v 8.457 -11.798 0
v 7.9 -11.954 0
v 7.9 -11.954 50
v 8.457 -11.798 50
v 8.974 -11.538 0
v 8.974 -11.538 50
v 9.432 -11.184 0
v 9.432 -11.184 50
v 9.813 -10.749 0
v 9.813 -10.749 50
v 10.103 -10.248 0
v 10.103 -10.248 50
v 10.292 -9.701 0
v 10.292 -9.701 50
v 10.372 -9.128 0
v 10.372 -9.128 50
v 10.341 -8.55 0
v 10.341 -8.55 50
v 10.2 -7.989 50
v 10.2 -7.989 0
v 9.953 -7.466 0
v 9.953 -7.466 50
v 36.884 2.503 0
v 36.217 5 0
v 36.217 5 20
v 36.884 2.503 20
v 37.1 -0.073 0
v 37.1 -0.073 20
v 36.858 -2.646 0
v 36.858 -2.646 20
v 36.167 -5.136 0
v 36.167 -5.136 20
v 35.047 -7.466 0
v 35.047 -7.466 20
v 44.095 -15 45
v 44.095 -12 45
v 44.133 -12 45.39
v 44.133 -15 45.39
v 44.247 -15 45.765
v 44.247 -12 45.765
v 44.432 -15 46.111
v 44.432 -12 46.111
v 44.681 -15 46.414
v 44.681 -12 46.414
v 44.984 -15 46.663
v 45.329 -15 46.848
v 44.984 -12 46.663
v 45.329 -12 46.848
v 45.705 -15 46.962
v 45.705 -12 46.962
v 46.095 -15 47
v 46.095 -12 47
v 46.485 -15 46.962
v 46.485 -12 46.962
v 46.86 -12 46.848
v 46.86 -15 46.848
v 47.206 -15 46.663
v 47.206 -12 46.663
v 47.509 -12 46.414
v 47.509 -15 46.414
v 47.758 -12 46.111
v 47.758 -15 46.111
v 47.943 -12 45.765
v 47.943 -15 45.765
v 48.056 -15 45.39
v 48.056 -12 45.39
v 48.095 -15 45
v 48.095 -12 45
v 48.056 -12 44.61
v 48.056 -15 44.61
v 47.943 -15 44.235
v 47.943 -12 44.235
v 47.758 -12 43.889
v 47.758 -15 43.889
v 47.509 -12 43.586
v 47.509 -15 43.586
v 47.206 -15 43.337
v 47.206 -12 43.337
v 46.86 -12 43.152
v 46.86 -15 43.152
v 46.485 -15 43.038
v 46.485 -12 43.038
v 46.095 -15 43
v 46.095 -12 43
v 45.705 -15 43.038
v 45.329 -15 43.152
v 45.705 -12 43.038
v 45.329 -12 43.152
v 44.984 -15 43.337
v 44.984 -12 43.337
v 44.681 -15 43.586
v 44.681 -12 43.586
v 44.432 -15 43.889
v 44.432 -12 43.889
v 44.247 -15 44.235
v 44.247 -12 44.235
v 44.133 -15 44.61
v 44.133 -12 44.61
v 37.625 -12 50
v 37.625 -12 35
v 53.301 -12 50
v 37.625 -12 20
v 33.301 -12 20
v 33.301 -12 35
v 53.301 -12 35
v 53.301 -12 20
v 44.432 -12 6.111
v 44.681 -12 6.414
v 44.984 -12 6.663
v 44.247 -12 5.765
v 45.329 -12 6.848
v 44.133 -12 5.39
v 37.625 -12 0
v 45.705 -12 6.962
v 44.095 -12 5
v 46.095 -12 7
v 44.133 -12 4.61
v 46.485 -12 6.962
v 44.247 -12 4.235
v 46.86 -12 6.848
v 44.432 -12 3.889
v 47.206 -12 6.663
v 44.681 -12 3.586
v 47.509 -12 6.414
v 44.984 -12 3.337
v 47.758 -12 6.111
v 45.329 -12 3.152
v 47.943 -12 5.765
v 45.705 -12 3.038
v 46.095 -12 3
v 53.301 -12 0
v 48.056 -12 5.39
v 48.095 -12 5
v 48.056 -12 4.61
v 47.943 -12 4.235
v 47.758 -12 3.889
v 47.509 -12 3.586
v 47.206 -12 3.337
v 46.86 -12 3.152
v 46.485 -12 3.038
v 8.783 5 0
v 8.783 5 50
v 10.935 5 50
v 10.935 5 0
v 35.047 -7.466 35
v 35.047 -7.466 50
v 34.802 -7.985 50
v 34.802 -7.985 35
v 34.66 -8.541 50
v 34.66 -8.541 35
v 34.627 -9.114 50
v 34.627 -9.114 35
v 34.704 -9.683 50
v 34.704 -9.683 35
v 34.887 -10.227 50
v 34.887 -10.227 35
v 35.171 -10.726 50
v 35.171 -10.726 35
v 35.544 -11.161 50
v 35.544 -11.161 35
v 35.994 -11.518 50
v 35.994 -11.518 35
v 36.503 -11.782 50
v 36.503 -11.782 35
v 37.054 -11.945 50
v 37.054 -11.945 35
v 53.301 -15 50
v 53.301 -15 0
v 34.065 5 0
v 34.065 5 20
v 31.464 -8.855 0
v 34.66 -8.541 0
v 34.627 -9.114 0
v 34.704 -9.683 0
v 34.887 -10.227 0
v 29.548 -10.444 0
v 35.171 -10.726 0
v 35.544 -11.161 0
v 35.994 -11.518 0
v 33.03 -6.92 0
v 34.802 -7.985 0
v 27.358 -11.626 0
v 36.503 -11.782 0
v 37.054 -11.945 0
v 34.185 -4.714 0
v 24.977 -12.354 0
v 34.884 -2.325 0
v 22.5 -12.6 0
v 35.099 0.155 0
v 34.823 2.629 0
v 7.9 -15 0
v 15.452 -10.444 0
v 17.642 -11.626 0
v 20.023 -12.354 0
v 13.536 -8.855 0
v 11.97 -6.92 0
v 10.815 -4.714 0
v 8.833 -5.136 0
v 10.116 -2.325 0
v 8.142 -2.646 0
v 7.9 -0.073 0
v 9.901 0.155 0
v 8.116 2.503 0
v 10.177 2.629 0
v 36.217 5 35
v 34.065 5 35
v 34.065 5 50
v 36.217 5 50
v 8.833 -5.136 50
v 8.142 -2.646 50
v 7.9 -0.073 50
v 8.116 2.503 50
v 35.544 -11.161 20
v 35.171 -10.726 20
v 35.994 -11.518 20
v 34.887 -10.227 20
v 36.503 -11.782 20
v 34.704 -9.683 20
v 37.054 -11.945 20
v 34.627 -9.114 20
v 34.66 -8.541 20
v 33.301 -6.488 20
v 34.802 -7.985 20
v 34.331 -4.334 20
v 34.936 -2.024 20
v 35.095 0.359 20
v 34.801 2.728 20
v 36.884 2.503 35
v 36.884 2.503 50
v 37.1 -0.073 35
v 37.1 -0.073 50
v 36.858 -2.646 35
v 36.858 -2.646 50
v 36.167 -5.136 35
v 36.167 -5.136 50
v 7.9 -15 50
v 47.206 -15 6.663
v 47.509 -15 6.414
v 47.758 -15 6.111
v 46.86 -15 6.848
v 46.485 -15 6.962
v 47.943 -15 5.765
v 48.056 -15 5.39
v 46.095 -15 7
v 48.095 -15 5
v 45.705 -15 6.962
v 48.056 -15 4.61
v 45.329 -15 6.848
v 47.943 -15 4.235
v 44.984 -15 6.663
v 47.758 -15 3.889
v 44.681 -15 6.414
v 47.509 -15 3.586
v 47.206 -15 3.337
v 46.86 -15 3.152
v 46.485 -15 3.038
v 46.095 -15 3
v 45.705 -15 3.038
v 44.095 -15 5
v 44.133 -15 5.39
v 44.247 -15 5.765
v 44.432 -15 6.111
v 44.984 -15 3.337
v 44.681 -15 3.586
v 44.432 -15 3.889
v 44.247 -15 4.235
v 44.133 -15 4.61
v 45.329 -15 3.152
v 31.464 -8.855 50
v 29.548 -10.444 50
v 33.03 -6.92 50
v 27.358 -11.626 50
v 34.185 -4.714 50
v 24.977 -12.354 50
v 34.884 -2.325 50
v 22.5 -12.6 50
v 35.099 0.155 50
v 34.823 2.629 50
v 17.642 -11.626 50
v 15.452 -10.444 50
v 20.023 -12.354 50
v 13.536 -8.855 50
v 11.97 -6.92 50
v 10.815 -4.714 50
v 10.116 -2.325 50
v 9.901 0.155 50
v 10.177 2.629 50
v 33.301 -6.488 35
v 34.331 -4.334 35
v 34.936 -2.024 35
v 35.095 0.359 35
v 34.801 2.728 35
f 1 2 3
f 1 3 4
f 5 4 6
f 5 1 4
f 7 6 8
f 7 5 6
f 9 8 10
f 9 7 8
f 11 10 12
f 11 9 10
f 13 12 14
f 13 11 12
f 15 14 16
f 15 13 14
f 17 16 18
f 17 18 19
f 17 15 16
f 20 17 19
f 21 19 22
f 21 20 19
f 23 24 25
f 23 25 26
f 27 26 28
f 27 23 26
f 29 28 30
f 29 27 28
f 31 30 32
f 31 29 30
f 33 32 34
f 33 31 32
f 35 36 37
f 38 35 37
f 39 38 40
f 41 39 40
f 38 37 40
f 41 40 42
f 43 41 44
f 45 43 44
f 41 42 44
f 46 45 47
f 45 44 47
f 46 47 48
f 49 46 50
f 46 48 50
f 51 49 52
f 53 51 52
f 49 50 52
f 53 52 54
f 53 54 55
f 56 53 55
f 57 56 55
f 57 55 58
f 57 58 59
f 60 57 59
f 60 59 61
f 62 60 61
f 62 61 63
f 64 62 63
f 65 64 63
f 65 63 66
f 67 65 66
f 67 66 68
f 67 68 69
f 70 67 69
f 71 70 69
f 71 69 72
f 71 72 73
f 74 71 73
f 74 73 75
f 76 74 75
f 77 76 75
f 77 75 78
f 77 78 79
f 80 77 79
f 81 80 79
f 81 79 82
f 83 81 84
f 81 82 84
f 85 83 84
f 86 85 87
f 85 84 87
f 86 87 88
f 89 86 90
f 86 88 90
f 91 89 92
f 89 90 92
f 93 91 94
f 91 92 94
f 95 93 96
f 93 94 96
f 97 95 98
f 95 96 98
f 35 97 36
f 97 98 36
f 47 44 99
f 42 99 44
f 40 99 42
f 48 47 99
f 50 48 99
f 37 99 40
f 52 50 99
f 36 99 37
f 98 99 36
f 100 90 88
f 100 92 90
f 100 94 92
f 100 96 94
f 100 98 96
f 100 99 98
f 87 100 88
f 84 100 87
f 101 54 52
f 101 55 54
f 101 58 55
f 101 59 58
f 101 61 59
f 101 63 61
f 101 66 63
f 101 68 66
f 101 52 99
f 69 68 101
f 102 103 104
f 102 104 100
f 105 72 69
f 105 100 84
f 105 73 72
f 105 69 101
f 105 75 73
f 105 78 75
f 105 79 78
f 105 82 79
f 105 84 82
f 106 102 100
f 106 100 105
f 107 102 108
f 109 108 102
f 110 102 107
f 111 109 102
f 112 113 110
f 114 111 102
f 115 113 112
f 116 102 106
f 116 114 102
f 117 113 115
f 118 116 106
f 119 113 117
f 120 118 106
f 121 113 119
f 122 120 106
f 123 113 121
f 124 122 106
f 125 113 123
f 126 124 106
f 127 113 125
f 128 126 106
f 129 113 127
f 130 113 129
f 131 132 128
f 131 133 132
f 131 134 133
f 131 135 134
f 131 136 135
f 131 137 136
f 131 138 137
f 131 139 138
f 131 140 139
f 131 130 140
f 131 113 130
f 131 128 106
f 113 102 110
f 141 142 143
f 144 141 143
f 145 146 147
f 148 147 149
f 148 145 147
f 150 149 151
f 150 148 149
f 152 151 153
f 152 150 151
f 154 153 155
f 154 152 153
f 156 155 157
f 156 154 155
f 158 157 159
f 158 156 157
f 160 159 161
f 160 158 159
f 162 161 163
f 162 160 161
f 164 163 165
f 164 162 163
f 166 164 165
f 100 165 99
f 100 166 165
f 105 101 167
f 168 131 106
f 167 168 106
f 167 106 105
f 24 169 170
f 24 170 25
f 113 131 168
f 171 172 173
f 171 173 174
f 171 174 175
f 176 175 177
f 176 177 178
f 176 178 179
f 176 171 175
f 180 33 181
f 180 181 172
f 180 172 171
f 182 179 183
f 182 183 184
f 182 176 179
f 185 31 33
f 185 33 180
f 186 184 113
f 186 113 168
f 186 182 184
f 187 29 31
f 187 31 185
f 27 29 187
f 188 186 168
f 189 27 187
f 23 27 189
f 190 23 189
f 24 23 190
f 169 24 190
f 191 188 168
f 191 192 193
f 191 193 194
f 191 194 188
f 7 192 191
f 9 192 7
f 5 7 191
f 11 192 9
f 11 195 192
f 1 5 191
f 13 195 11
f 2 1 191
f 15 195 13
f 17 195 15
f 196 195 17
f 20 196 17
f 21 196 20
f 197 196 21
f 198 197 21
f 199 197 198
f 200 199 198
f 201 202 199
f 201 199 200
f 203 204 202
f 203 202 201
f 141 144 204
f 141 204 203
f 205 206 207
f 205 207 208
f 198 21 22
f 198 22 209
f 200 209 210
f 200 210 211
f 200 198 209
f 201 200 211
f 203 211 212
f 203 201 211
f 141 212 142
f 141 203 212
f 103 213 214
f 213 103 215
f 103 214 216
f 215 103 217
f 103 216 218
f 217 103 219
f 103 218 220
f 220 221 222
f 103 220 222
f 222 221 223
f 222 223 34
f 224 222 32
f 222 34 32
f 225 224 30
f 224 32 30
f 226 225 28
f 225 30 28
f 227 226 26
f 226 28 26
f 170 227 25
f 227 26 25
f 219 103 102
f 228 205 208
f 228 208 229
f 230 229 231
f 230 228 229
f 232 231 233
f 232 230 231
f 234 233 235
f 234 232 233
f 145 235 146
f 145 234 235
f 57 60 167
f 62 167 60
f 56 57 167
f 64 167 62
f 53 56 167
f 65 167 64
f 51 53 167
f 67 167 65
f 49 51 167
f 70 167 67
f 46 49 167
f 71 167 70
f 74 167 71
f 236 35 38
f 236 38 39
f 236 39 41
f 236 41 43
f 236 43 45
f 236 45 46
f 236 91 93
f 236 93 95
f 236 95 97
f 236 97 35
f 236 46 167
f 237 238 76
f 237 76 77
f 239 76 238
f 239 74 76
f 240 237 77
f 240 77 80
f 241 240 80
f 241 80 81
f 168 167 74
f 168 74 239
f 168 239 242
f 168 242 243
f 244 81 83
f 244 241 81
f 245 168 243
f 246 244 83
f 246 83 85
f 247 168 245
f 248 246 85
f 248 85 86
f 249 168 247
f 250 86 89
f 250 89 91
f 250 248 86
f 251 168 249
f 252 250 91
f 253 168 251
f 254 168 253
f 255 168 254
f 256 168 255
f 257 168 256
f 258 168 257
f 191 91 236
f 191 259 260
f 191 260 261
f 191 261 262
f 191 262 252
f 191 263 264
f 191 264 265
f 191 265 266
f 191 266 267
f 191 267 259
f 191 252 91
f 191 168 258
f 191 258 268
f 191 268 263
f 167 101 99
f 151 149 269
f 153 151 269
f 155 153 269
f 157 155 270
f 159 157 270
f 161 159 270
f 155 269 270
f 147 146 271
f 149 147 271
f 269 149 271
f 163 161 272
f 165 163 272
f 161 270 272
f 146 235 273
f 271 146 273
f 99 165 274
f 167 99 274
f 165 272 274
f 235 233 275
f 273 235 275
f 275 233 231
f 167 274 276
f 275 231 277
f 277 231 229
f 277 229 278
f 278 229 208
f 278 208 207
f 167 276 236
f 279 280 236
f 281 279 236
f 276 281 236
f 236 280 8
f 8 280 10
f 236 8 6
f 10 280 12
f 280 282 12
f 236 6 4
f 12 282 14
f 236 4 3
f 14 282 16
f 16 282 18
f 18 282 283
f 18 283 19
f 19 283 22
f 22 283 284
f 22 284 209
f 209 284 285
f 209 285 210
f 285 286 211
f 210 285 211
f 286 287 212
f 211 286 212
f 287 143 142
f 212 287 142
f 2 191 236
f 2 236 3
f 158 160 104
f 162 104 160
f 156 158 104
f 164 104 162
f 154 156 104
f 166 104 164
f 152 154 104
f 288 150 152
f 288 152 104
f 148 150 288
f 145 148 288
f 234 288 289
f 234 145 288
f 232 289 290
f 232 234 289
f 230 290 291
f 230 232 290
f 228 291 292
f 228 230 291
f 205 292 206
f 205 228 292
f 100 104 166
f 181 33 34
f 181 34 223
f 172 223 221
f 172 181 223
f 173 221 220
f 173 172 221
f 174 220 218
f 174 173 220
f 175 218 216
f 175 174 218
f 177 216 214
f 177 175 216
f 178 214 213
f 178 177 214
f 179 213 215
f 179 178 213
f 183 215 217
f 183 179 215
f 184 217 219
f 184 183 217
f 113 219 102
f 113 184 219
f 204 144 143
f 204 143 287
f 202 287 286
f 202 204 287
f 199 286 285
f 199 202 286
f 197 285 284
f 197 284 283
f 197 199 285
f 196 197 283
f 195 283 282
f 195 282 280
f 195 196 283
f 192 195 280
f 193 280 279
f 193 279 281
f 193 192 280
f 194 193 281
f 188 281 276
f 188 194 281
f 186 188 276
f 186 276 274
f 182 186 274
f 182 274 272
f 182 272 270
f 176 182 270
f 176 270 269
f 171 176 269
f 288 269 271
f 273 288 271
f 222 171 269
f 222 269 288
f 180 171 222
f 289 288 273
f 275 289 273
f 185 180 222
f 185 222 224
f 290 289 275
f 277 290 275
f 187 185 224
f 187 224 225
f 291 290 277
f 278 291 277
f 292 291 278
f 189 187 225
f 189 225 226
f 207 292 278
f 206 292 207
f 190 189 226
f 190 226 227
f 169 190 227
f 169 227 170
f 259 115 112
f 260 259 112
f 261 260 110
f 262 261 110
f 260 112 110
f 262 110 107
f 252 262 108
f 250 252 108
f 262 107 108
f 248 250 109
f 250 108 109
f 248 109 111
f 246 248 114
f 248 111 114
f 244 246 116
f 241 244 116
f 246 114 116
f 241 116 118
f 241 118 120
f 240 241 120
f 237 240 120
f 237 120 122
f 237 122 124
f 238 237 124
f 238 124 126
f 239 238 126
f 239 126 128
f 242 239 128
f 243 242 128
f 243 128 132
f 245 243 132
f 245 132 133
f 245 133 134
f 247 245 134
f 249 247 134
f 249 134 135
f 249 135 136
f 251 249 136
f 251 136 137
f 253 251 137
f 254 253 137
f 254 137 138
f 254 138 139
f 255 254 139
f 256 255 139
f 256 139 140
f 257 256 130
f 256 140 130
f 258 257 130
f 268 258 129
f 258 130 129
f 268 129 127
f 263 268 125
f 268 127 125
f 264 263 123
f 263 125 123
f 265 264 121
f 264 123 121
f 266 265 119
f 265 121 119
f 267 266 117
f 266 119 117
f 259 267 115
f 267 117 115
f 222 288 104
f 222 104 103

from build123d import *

# Parameters (mm, degrees)
BOSS_EXTRUDE1_DEPTH = 50
SKETCH2_W           = 15
SKETCH2_H           = 20.436302067
CUT_EXTRUDE1_DEPTH  = 20
SKETCH3_R           = 2
CUT_EXTRUDE2_DEPTH  = 76.033433569


with BuildPart() as part:
    # Sketch1 → Boss-Extrude1 (new body)
    with BuildSketch(Plane.XY):
        with BuildLine():
            Line((34.065465836, 5), (36.21714256, 5))
            ThreePointArc((36.21714256, 5), (37.036070696, -1.364788891), (35.046720745, -7.465909091))
            ThreePointArc((35.046720745, -7.465909091), (35.016915208, -10.48285658), (37.624814048, -12))
            Line((37.624814048, -12), (53.301183412, -12))
            Line((53.301183412, -12), (53.301183412, -15))
            Line((53.301183412, -15), (7.9, -15))
            Line((7.9, -15), (7.9, -11.953738346))
            ThreePointArc((7.9, -11.953738346), (10.103218459, -10.248134062), (9.953279255, -7.465909091))
            ThreePointArc((9.953279255, -7.465909091), (7.963929304, -1.364788891), (8.78285744, 5))
            Line((8.78285744, 5), (10.934534164, 5))
            ThreePointArc((10.934534164, 5), (22.5, -12.6), (34.065465836, 5))
        make_face()
    extrude(amount=BOSS_EXTRUDE1_DEPTH)

    # Sketch2 → Cut-Extrude1 (cut)
    with BuildSketch(Plane(origin=(53.301183412, 0, 0), x_dir=(0, 0, -1), z_dir=(1, 0, 0))):
        with Locations((-27.5, -1.781848967)):
            Rectangle(SKETCH2_W, SKETCH2_H)
    extrude(amount=-CUT_EXTRUDE1_DEPTH, mode=Mode.SUBTRACT)

    # Sketch3 → Cut-Extrude2 (cut, through all)
    with BuildSketch(Plane(origin=(0, -12, 0), x_dir=(1, 0, 0), z_dir=(0, 1, 0))):
        with Locations(Location((46.094817468, -45, 0), (0, 0, 180))):
            Circle(SKETCH3_R)
        with Locations(Location((46.094817468, -5, 0), (0, 0, 180))):
            Circle(SKETCH3_R)
    extrude(amount=-CUT_EXTRUDE2_DEPTH, mode=Mode.SUBTRACT)


solid = part.part
